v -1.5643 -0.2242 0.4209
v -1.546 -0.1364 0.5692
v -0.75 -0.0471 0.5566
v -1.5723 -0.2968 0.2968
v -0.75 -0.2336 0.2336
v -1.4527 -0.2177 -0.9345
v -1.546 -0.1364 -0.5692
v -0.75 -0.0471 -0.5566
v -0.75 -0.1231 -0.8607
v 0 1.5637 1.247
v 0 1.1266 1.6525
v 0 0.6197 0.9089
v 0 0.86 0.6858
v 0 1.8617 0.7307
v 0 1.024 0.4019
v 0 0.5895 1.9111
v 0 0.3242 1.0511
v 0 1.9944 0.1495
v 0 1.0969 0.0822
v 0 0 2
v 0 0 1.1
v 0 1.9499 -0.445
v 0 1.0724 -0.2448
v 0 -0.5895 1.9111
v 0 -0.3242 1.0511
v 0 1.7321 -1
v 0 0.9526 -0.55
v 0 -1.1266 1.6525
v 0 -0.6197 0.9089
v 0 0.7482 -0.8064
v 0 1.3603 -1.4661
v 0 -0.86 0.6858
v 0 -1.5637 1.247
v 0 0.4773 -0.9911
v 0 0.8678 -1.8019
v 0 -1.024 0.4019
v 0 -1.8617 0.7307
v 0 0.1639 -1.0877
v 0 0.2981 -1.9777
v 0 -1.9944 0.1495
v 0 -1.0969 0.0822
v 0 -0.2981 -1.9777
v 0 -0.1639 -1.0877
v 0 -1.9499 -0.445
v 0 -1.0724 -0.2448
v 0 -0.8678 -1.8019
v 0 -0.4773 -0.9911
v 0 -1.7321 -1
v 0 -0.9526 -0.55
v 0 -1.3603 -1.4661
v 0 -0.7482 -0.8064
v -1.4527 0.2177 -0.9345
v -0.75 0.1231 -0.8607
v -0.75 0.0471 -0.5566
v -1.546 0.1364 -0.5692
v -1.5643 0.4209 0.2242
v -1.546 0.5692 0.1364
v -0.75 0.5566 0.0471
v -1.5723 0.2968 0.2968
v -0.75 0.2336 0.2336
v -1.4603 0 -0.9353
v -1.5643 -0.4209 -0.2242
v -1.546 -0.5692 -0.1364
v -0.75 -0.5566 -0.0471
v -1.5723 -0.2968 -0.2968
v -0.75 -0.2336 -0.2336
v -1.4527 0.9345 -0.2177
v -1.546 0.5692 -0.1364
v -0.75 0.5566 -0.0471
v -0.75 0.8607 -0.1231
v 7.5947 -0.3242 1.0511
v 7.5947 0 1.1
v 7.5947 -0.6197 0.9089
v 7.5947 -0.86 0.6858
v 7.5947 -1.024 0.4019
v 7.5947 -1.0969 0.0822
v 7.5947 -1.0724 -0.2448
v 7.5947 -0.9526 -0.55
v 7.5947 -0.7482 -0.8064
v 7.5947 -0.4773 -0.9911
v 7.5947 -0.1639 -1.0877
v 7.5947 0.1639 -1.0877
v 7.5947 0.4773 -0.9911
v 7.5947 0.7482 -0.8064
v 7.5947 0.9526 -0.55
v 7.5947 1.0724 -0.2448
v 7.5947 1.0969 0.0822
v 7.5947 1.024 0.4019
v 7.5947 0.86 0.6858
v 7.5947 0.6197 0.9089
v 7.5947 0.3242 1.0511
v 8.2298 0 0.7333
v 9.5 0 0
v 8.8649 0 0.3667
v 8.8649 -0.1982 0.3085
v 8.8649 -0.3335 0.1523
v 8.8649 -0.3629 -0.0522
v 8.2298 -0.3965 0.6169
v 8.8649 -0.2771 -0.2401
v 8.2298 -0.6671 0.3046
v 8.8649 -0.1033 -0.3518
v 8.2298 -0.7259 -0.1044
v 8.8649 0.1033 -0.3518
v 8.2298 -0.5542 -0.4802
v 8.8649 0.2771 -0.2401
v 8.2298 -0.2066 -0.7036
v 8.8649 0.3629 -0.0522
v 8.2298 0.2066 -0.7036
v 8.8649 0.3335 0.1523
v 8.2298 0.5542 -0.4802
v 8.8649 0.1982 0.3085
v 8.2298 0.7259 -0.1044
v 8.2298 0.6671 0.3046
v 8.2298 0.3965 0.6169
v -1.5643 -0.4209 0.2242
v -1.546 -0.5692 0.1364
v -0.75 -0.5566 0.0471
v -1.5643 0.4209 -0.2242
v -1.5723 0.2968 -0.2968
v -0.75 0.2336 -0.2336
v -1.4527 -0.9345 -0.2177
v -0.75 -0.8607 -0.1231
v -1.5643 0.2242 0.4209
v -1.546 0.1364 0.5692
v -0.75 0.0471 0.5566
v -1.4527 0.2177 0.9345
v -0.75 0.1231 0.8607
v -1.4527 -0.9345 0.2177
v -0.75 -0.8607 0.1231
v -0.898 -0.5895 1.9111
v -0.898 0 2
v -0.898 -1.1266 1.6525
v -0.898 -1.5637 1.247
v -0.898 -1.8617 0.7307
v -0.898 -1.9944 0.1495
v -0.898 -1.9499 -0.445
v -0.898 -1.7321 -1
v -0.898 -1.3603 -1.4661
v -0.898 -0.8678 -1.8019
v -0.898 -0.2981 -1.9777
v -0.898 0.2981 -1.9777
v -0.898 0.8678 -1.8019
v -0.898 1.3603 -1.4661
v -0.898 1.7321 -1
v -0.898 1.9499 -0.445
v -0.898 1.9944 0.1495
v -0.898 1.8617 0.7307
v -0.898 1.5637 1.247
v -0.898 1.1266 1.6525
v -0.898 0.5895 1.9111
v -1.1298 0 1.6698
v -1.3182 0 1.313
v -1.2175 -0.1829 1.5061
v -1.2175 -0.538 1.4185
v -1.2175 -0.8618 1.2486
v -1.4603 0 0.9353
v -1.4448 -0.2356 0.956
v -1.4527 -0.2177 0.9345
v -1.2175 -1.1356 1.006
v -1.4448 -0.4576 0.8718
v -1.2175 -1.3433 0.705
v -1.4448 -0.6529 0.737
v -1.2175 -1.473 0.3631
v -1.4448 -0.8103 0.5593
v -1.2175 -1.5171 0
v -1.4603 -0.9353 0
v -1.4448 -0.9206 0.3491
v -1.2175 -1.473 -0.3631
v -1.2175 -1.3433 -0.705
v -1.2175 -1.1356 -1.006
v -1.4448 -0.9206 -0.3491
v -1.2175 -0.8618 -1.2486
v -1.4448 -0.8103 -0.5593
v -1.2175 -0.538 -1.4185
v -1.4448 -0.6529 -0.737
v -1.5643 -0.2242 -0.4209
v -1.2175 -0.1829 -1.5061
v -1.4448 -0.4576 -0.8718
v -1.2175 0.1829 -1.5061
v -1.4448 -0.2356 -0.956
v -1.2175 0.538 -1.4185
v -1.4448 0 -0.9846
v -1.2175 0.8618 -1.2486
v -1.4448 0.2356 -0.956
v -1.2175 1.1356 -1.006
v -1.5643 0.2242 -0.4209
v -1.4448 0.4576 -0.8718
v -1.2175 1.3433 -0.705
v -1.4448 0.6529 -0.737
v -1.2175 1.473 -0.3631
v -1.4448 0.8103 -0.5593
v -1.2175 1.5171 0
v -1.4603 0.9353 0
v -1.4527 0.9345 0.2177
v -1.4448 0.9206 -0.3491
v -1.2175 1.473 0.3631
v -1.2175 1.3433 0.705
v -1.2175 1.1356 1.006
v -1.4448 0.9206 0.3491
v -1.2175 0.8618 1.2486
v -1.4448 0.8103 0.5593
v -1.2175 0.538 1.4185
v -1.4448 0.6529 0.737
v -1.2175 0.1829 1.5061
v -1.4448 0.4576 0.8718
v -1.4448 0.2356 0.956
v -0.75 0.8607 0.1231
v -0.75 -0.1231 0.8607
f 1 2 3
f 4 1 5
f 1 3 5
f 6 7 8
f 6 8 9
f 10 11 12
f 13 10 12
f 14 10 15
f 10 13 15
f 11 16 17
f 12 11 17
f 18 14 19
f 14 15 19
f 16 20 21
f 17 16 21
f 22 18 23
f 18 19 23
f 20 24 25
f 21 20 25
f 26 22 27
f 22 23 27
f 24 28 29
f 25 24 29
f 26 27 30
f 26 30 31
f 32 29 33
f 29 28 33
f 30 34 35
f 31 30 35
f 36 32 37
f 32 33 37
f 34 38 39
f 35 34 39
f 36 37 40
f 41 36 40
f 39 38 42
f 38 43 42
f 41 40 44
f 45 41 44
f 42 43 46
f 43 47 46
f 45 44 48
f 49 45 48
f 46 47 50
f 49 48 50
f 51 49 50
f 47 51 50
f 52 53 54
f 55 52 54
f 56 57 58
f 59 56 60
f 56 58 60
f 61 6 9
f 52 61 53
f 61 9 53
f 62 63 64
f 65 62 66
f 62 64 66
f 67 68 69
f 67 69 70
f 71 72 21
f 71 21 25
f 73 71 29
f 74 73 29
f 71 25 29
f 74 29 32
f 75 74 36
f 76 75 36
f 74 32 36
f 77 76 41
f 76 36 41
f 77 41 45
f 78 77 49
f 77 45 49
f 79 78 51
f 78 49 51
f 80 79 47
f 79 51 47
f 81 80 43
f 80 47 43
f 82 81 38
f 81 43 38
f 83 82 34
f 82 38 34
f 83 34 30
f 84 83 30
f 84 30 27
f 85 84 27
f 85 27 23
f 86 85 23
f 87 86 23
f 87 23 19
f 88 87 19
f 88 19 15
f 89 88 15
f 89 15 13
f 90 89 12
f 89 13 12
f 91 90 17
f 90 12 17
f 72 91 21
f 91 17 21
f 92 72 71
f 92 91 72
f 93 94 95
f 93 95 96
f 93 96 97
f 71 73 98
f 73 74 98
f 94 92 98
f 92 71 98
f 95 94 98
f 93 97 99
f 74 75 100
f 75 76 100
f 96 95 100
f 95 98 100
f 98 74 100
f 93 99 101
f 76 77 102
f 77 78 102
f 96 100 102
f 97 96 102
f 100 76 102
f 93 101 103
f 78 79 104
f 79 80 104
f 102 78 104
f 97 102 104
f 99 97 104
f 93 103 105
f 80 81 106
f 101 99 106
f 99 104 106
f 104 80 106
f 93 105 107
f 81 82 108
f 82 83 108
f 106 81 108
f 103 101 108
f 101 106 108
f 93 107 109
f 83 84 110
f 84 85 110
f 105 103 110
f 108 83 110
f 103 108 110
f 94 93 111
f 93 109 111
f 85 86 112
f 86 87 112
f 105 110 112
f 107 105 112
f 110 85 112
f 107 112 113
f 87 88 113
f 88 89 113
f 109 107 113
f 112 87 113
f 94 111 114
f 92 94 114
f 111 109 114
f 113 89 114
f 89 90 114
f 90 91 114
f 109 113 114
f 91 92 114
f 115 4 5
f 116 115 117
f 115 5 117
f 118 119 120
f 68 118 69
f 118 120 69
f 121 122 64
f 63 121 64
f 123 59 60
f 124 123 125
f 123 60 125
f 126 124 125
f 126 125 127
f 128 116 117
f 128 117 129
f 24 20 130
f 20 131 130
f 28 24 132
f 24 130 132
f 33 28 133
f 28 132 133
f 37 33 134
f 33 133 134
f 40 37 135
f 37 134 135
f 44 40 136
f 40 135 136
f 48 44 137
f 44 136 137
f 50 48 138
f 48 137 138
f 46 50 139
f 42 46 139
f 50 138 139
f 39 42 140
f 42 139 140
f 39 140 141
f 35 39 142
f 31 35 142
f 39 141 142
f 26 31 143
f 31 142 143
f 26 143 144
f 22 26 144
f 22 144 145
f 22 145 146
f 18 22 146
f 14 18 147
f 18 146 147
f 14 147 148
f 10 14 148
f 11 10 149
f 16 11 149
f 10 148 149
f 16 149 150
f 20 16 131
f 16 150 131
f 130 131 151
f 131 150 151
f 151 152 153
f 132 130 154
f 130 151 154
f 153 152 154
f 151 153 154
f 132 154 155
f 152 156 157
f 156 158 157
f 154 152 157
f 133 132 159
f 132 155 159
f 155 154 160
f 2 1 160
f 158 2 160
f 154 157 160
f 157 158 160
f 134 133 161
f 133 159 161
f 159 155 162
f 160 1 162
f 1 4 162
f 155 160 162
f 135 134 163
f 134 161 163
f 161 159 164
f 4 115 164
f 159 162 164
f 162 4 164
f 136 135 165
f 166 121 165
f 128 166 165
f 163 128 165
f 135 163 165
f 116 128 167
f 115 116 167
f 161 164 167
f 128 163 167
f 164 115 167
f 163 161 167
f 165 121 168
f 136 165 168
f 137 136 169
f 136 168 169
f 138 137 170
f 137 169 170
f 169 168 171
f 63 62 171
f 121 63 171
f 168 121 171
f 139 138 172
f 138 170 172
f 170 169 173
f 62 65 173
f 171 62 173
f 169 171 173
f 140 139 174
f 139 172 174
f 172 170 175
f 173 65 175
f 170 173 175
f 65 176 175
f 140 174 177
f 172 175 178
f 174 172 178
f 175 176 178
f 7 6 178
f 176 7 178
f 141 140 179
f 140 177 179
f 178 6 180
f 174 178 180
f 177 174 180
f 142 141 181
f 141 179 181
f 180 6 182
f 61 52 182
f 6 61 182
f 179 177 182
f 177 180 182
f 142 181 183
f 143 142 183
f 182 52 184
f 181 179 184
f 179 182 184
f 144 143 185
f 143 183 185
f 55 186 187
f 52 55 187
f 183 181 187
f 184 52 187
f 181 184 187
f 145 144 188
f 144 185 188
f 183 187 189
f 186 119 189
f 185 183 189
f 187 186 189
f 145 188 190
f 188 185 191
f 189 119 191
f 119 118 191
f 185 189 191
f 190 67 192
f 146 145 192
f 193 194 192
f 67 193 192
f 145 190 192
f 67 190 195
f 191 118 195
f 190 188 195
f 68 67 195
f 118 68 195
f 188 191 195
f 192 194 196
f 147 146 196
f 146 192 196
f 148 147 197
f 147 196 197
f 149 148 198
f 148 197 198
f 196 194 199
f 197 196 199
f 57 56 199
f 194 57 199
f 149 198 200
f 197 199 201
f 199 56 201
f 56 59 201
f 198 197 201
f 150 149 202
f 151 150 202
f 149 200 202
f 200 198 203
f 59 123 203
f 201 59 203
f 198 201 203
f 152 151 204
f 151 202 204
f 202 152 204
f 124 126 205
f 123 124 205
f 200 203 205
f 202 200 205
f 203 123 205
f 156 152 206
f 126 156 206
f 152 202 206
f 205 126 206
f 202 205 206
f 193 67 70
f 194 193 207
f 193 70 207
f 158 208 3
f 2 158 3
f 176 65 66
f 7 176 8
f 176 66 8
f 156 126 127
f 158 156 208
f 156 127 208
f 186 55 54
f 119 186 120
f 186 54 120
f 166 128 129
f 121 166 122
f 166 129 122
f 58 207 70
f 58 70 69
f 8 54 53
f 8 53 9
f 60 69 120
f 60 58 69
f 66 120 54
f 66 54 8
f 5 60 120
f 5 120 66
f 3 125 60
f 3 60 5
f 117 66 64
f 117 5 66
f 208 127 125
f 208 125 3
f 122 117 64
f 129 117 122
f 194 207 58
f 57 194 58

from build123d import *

# Parameters (mm, degrees)
CHAMFER1_SIZE      = 0.22
CHAMFER1_SIZE2     = 0.381051178
CUT_EXTRUDE1_DEPTH = 0.85
CUT_EXTRUDE1_TAPER = 6


with BuildPart() as part:
    # Sketch1 → Revolve1 (revolve)
    with BuildSketch(Plane.XY, mode=Mode.PRIVATE) as revolve1_sk:
        with BuildLine():
            Line((0, 2), (-0.897999199, 2))
            ThreePointArc((-0.897999199, 2), (-1.419403703, 1.059811908), (-1.6, 0))
            Line((-1.6, 0), (9.5, 0))
            Line((9.5, 0), (9.5, 1.1))
            Line((9.5, 1.1), (0, 1.1))
            Line((0, 1.1), (0, 2))
        make_face()
    revolve(revolve1_sk.sketch.rotate(Axis((0, 0, 0), (1, 0, 0)), 90), axis=Axis((0, 0, 0), (1, 0, 0)))

    # Chamfer1
    chamfer1_edges = [part.edges().sort_by_distance(p)[0] for p in [
        (9.5, 0, -1.1),
    ]]
    chamfer1_side = [part.faces().sort_by_distance(p)[0] for p in [
        (9.5, 0, 0),
    ]]
    chamfer(chamfer1_edges, length=CHAMFER1_SIZE, length2=CHAMFER1_SIZE2, reference=chamfer1_side[0])

    # Sketch2 → EndCone (revolve, cut)
    with BuildSketch(Plane.XY, mode=Mode.PRIVATE) as endcone_sk:
        Polygon((9.5, 0), (7.594744112, 1.1), (7.594744112, 1.2), (9.6, 1.2), (9.6, 0), align=None)
    revolve(endcone_sk.sketch.rotate(Axis((0, 0, 0), (1, 0, 0)), 90), axis=Axis((0, 0, 0), (1, 0, 0)), mode=Mode.SUBTRACT)

    # Sketch3 → Cut-Extrude1 (cut)
    with BuildSketch(Plane(origin=(-1.6, 0, 0), x_dir=(0, 0, -1), z_dir=(1, 0, 0))):
        Polygon((-0.2375, 0.95), (-0.1425, 0.57), (-0.29897586, 0.29897586), (-0.57, 0.1425), (-0.95, 0.2375), (-0.95, -0.2375), (-0.57, -0.1425), (-0.29897586, -0.29897586), (-0.1425, -0.57), (-0.2375, -0.95), (0.2375, -0.95), (0.1425, -0.57), (0.29897586, -0.29897586), (0.57, -0.1425), (0.95, -0.2375), (0.95, 0.2375), (0.57, 0.1425), (0.29897586, 0.29897586), (0.1425, 0.57), (0.2375, 0.95), align=None)
    extrude(amount=CUT_EXTRUDE1_DEPTH, taper=CUT_EXTRUDE1_TAPER, mode=Mode.SUBTRACT)


solid = part.part
